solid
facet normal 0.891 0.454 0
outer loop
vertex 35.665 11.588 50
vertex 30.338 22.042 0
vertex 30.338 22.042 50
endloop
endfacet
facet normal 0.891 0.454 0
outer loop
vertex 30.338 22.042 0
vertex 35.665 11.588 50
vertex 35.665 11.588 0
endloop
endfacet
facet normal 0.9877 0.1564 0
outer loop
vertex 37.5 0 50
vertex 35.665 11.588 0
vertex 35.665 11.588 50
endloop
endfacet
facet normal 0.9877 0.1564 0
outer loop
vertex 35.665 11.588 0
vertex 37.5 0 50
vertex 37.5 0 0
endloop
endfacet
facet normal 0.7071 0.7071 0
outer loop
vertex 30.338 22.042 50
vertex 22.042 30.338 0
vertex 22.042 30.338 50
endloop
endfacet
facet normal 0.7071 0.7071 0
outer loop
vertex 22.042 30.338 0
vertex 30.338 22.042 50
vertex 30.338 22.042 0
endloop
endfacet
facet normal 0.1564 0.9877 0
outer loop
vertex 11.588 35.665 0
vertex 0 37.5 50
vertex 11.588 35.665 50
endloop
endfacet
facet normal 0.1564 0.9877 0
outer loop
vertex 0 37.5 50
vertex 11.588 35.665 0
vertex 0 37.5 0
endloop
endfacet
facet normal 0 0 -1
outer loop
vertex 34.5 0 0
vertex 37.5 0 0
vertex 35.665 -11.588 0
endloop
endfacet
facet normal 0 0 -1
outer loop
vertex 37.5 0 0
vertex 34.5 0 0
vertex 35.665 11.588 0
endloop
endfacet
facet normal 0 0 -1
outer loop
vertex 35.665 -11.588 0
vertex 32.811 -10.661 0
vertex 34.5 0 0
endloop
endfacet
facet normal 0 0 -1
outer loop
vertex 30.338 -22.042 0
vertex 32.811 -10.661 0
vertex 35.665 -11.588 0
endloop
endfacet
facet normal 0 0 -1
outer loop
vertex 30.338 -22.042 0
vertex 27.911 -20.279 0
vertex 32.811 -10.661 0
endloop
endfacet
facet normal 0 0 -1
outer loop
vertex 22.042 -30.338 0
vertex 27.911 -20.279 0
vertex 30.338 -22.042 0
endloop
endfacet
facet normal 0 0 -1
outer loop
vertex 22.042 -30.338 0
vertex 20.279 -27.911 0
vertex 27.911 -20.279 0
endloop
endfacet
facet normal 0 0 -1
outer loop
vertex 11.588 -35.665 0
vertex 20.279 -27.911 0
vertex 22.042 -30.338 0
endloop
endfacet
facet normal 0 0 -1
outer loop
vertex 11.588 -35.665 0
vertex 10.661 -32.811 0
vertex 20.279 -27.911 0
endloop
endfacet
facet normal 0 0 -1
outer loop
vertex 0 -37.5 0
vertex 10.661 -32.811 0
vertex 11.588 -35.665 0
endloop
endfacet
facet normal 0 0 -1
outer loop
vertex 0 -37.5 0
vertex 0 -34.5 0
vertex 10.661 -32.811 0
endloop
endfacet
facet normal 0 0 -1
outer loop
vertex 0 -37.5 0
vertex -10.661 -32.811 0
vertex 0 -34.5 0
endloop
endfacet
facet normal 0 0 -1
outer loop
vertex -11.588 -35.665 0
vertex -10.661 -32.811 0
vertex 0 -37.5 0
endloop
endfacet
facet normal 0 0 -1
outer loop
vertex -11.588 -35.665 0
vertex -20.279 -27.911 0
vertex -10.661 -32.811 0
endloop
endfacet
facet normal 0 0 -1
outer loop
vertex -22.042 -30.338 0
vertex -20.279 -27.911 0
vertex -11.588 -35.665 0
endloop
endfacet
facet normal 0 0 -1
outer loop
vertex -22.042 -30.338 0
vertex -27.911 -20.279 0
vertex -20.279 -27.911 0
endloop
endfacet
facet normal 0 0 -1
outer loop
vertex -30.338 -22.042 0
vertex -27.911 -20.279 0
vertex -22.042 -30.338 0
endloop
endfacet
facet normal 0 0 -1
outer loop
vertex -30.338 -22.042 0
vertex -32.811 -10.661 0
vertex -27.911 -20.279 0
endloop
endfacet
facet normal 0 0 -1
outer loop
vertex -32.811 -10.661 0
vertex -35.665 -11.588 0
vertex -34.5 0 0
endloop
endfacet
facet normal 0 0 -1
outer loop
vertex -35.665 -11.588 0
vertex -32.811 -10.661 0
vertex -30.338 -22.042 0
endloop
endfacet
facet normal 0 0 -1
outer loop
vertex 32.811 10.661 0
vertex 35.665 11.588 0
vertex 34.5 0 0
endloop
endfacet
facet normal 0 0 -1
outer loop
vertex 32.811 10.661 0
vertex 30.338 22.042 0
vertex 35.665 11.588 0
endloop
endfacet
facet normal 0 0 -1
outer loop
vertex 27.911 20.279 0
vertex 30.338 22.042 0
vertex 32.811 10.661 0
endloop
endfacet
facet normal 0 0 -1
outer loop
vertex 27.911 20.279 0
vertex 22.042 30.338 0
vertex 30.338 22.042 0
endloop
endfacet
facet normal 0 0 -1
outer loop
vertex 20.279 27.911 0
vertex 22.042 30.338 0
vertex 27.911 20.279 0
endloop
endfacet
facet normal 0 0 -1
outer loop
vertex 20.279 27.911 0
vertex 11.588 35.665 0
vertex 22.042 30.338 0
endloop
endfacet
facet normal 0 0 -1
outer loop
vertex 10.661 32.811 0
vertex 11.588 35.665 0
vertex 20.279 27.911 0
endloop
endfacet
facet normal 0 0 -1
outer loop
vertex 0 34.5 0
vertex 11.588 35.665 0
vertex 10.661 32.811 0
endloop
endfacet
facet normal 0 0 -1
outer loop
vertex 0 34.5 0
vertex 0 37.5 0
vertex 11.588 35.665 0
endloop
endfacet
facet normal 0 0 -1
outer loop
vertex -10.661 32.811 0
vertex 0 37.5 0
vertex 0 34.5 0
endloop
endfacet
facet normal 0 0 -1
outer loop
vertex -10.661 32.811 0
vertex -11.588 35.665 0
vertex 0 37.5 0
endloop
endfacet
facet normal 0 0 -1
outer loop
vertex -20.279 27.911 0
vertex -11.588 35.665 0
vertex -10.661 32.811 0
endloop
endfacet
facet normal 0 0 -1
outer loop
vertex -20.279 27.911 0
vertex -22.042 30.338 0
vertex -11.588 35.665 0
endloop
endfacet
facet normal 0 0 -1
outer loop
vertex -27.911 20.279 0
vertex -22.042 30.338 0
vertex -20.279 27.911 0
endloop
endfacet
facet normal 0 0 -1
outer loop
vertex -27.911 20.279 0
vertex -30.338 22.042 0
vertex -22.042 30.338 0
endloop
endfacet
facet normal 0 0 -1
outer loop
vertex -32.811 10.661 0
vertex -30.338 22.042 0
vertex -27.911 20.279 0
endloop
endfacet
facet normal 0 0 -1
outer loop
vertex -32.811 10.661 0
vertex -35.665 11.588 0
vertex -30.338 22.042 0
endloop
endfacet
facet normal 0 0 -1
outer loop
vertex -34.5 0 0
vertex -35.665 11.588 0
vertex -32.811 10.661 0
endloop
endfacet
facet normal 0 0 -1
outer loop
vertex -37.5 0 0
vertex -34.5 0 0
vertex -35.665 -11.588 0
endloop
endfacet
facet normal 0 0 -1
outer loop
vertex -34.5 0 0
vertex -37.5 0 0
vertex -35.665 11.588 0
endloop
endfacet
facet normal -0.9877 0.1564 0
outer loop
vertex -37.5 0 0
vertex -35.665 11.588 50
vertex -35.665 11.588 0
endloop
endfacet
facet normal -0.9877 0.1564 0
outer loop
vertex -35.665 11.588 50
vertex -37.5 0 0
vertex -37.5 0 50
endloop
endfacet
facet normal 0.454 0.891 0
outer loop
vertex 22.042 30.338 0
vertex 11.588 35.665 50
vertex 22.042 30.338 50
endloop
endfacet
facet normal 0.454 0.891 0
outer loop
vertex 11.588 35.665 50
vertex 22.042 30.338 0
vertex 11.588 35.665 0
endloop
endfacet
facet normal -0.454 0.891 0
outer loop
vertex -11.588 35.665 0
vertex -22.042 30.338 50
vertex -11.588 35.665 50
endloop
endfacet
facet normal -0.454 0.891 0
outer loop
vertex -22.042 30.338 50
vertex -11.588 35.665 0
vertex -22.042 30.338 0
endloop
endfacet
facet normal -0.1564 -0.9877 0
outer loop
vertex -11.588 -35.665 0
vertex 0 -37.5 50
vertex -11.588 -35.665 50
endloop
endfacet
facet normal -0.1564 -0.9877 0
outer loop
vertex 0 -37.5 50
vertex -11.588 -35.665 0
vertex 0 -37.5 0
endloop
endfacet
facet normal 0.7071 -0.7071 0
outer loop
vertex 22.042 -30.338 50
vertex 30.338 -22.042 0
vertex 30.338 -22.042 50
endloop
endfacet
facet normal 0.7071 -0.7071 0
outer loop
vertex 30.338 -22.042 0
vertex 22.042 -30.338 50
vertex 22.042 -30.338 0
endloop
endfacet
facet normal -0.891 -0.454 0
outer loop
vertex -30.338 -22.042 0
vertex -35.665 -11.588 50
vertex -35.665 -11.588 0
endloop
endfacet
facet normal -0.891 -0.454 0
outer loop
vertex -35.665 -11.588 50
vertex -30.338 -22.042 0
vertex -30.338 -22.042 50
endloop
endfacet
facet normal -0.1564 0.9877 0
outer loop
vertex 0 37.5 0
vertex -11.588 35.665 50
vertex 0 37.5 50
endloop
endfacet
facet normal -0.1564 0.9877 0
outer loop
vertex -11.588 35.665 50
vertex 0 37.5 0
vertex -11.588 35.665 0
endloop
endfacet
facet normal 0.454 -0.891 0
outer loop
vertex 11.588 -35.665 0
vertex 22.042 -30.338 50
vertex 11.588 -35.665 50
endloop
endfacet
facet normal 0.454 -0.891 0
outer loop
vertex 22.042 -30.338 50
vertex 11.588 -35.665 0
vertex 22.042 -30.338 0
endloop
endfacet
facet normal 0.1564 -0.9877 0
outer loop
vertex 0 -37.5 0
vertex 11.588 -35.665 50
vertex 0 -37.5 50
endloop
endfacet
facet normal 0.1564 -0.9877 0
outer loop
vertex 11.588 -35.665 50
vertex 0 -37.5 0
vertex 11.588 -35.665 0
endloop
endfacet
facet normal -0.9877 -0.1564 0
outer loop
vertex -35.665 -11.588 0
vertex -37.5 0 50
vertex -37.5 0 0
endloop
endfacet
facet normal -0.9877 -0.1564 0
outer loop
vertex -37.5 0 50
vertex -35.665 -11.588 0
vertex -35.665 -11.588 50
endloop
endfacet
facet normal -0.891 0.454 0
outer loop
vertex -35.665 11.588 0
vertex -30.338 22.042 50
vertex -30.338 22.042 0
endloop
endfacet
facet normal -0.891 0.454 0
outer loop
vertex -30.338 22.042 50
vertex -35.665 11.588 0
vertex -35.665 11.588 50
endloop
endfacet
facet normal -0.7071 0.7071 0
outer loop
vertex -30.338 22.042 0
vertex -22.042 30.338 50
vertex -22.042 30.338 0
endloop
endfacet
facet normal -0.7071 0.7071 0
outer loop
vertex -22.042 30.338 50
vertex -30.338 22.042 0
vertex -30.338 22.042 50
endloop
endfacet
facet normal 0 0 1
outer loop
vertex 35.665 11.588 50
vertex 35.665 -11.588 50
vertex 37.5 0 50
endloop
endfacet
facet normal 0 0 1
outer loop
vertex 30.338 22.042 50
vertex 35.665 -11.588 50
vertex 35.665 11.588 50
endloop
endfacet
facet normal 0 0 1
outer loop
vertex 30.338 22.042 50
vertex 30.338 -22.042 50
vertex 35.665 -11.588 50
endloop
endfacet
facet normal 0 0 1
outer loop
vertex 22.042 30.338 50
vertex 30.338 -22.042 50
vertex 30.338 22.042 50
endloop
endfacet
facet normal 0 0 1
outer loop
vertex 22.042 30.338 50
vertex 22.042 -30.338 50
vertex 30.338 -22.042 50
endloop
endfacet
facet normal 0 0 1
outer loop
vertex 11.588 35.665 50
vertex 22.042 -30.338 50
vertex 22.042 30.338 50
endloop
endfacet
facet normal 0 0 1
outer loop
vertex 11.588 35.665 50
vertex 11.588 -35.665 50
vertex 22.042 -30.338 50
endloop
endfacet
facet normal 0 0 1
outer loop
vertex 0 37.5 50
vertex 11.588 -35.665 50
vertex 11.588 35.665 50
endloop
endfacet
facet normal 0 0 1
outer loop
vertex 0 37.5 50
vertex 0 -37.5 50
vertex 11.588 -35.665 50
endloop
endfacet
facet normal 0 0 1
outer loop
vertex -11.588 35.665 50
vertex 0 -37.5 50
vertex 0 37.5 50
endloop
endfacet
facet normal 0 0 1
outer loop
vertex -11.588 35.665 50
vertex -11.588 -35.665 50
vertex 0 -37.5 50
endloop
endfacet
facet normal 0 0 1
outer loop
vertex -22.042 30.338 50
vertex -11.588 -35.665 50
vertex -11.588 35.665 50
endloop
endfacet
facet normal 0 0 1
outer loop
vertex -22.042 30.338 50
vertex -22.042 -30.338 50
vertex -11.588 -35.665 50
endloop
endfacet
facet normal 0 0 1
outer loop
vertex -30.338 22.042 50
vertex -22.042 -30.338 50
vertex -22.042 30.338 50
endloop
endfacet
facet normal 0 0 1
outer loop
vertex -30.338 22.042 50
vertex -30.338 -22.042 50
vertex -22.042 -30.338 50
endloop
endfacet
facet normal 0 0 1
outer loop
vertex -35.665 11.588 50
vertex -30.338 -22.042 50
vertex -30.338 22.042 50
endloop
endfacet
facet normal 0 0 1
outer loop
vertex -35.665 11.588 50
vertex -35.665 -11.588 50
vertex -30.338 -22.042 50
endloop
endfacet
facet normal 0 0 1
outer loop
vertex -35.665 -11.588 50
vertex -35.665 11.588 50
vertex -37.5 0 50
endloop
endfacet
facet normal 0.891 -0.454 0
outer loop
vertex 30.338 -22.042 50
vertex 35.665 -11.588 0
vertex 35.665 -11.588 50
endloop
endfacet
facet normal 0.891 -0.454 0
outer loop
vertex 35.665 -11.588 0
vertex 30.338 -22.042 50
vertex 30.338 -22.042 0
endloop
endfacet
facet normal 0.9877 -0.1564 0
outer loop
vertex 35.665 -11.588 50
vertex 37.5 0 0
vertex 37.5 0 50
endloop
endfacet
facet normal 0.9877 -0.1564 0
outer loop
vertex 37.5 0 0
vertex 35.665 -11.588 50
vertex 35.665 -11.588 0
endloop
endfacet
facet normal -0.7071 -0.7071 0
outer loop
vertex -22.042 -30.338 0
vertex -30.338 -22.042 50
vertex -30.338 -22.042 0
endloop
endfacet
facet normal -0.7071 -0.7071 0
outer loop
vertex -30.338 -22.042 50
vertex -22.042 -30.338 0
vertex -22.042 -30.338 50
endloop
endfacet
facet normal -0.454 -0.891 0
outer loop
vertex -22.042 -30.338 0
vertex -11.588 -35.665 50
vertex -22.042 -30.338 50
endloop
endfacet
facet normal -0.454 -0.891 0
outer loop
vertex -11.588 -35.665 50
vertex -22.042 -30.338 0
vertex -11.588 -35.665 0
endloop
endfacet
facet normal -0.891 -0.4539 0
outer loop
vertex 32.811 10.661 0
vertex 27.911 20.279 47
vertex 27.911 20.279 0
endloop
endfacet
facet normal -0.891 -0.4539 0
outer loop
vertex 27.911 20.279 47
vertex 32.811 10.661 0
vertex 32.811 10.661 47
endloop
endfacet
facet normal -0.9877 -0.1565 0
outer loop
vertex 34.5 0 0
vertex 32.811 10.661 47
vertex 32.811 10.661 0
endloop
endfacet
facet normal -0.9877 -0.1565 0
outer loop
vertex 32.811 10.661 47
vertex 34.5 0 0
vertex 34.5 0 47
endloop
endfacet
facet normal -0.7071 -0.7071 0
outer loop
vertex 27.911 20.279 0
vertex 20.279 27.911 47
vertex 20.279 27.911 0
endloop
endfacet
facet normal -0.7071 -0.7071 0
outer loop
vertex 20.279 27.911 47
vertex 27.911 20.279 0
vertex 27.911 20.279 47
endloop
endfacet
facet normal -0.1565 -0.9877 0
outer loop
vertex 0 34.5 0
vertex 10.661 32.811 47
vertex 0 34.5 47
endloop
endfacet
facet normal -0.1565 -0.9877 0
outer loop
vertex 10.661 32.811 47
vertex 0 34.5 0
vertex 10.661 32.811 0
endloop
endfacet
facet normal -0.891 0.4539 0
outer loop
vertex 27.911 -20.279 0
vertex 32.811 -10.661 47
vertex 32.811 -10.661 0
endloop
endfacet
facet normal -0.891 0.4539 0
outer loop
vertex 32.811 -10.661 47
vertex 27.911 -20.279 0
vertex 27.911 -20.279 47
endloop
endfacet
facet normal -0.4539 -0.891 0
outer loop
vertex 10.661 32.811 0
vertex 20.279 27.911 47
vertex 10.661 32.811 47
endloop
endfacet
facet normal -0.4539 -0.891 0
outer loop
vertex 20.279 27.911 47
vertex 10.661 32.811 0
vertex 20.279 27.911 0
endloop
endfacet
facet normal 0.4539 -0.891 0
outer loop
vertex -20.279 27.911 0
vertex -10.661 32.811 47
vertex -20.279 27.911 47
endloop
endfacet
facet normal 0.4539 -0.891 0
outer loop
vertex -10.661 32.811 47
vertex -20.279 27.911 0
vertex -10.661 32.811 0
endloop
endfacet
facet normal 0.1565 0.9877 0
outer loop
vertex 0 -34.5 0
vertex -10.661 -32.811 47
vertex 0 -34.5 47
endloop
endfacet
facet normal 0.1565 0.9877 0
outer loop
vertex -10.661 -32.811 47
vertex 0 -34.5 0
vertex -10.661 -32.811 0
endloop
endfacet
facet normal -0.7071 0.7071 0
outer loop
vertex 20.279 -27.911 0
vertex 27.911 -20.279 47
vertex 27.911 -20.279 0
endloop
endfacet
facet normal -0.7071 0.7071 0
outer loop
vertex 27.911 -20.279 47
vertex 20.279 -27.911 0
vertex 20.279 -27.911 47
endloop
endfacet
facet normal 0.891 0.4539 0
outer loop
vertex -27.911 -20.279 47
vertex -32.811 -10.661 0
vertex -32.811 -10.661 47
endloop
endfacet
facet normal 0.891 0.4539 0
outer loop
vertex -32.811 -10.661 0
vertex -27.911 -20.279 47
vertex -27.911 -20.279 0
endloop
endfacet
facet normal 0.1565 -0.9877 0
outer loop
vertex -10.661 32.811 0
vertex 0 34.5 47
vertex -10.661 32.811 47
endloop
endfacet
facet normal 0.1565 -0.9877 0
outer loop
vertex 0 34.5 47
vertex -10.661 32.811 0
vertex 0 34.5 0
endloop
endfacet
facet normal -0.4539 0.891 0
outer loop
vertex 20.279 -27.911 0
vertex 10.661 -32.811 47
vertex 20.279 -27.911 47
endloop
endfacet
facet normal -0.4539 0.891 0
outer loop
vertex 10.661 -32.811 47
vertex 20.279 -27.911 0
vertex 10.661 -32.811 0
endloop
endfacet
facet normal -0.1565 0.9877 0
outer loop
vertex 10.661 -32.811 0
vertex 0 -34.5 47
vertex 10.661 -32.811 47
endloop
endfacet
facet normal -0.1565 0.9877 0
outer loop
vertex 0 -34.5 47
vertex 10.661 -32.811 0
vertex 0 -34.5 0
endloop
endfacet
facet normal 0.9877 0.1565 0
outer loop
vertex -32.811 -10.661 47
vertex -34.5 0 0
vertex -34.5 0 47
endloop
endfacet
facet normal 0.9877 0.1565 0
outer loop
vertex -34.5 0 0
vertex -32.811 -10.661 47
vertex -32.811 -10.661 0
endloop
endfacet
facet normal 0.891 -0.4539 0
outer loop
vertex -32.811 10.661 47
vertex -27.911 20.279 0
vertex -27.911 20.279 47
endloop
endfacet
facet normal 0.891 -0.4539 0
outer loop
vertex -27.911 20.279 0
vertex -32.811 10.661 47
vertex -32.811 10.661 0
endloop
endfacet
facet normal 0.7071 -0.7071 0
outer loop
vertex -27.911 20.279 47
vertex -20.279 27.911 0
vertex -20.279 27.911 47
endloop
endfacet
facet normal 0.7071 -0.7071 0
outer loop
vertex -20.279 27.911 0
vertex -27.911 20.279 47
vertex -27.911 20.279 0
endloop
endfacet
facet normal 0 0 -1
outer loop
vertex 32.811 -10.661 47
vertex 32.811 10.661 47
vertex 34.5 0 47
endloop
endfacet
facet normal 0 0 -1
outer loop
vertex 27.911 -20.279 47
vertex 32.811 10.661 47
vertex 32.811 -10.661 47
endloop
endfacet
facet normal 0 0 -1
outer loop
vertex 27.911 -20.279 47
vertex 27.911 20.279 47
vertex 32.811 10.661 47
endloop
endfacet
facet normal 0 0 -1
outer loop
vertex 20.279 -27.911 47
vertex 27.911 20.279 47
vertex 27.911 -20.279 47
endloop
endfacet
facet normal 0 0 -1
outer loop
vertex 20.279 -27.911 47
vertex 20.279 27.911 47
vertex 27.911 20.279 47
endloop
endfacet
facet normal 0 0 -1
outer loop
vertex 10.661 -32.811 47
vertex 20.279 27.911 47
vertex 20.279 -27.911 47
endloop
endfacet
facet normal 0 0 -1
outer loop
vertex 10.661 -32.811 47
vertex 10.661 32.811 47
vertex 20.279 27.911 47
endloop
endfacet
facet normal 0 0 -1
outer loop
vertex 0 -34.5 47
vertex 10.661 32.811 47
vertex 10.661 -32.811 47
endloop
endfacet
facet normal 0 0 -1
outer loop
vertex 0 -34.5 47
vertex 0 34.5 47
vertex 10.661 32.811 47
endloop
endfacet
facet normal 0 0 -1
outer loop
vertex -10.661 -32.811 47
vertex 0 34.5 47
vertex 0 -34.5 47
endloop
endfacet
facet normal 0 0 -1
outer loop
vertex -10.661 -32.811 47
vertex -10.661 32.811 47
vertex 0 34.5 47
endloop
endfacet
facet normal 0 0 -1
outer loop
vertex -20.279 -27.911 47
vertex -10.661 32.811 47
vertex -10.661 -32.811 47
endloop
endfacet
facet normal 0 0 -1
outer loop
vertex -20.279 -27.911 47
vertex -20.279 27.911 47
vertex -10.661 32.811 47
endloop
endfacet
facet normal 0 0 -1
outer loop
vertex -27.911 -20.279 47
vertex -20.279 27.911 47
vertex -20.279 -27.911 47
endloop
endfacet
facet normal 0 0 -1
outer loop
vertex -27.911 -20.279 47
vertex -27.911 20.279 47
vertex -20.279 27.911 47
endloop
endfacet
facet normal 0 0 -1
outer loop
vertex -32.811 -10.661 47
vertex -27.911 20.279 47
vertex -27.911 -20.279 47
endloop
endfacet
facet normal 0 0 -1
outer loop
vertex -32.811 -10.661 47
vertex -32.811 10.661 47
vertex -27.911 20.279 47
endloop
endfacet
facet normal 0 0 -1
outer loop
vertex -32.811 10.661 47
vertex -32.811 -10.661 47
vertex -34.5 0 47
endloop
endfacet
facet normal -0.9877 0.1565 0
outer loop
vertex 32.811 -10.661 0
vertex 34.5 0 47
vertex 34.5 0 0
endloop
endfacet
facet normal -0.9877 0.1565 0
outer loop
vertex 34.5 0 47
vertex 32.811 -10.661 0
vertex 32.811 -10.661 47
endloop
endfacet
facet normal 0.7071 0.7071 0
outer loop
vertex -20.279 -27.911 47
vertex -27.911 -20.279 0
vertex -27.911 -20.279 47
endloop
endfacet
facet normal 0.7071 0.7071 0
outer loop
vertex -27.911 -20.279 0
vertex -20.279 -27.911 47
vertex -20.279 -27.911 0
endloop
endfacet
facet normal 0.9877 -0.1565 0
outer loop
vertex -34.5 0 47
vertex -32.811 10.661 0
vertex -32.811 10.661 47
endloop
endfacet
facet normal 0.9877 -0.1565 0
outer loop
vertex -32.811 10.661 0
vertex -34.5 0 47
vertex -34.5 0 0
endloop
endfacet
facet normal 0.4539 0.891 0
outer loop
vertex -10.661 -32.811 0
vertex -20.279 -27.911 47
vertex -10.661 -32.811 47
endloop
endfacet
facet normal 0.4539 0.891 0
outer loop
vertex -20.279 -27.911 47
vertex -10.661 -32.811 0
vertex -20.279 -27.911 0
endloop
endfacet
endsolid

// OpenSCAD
$fn = 20;
difference() {
  cylinder(50, d=75);
  cylinder(47, d=69);
}
